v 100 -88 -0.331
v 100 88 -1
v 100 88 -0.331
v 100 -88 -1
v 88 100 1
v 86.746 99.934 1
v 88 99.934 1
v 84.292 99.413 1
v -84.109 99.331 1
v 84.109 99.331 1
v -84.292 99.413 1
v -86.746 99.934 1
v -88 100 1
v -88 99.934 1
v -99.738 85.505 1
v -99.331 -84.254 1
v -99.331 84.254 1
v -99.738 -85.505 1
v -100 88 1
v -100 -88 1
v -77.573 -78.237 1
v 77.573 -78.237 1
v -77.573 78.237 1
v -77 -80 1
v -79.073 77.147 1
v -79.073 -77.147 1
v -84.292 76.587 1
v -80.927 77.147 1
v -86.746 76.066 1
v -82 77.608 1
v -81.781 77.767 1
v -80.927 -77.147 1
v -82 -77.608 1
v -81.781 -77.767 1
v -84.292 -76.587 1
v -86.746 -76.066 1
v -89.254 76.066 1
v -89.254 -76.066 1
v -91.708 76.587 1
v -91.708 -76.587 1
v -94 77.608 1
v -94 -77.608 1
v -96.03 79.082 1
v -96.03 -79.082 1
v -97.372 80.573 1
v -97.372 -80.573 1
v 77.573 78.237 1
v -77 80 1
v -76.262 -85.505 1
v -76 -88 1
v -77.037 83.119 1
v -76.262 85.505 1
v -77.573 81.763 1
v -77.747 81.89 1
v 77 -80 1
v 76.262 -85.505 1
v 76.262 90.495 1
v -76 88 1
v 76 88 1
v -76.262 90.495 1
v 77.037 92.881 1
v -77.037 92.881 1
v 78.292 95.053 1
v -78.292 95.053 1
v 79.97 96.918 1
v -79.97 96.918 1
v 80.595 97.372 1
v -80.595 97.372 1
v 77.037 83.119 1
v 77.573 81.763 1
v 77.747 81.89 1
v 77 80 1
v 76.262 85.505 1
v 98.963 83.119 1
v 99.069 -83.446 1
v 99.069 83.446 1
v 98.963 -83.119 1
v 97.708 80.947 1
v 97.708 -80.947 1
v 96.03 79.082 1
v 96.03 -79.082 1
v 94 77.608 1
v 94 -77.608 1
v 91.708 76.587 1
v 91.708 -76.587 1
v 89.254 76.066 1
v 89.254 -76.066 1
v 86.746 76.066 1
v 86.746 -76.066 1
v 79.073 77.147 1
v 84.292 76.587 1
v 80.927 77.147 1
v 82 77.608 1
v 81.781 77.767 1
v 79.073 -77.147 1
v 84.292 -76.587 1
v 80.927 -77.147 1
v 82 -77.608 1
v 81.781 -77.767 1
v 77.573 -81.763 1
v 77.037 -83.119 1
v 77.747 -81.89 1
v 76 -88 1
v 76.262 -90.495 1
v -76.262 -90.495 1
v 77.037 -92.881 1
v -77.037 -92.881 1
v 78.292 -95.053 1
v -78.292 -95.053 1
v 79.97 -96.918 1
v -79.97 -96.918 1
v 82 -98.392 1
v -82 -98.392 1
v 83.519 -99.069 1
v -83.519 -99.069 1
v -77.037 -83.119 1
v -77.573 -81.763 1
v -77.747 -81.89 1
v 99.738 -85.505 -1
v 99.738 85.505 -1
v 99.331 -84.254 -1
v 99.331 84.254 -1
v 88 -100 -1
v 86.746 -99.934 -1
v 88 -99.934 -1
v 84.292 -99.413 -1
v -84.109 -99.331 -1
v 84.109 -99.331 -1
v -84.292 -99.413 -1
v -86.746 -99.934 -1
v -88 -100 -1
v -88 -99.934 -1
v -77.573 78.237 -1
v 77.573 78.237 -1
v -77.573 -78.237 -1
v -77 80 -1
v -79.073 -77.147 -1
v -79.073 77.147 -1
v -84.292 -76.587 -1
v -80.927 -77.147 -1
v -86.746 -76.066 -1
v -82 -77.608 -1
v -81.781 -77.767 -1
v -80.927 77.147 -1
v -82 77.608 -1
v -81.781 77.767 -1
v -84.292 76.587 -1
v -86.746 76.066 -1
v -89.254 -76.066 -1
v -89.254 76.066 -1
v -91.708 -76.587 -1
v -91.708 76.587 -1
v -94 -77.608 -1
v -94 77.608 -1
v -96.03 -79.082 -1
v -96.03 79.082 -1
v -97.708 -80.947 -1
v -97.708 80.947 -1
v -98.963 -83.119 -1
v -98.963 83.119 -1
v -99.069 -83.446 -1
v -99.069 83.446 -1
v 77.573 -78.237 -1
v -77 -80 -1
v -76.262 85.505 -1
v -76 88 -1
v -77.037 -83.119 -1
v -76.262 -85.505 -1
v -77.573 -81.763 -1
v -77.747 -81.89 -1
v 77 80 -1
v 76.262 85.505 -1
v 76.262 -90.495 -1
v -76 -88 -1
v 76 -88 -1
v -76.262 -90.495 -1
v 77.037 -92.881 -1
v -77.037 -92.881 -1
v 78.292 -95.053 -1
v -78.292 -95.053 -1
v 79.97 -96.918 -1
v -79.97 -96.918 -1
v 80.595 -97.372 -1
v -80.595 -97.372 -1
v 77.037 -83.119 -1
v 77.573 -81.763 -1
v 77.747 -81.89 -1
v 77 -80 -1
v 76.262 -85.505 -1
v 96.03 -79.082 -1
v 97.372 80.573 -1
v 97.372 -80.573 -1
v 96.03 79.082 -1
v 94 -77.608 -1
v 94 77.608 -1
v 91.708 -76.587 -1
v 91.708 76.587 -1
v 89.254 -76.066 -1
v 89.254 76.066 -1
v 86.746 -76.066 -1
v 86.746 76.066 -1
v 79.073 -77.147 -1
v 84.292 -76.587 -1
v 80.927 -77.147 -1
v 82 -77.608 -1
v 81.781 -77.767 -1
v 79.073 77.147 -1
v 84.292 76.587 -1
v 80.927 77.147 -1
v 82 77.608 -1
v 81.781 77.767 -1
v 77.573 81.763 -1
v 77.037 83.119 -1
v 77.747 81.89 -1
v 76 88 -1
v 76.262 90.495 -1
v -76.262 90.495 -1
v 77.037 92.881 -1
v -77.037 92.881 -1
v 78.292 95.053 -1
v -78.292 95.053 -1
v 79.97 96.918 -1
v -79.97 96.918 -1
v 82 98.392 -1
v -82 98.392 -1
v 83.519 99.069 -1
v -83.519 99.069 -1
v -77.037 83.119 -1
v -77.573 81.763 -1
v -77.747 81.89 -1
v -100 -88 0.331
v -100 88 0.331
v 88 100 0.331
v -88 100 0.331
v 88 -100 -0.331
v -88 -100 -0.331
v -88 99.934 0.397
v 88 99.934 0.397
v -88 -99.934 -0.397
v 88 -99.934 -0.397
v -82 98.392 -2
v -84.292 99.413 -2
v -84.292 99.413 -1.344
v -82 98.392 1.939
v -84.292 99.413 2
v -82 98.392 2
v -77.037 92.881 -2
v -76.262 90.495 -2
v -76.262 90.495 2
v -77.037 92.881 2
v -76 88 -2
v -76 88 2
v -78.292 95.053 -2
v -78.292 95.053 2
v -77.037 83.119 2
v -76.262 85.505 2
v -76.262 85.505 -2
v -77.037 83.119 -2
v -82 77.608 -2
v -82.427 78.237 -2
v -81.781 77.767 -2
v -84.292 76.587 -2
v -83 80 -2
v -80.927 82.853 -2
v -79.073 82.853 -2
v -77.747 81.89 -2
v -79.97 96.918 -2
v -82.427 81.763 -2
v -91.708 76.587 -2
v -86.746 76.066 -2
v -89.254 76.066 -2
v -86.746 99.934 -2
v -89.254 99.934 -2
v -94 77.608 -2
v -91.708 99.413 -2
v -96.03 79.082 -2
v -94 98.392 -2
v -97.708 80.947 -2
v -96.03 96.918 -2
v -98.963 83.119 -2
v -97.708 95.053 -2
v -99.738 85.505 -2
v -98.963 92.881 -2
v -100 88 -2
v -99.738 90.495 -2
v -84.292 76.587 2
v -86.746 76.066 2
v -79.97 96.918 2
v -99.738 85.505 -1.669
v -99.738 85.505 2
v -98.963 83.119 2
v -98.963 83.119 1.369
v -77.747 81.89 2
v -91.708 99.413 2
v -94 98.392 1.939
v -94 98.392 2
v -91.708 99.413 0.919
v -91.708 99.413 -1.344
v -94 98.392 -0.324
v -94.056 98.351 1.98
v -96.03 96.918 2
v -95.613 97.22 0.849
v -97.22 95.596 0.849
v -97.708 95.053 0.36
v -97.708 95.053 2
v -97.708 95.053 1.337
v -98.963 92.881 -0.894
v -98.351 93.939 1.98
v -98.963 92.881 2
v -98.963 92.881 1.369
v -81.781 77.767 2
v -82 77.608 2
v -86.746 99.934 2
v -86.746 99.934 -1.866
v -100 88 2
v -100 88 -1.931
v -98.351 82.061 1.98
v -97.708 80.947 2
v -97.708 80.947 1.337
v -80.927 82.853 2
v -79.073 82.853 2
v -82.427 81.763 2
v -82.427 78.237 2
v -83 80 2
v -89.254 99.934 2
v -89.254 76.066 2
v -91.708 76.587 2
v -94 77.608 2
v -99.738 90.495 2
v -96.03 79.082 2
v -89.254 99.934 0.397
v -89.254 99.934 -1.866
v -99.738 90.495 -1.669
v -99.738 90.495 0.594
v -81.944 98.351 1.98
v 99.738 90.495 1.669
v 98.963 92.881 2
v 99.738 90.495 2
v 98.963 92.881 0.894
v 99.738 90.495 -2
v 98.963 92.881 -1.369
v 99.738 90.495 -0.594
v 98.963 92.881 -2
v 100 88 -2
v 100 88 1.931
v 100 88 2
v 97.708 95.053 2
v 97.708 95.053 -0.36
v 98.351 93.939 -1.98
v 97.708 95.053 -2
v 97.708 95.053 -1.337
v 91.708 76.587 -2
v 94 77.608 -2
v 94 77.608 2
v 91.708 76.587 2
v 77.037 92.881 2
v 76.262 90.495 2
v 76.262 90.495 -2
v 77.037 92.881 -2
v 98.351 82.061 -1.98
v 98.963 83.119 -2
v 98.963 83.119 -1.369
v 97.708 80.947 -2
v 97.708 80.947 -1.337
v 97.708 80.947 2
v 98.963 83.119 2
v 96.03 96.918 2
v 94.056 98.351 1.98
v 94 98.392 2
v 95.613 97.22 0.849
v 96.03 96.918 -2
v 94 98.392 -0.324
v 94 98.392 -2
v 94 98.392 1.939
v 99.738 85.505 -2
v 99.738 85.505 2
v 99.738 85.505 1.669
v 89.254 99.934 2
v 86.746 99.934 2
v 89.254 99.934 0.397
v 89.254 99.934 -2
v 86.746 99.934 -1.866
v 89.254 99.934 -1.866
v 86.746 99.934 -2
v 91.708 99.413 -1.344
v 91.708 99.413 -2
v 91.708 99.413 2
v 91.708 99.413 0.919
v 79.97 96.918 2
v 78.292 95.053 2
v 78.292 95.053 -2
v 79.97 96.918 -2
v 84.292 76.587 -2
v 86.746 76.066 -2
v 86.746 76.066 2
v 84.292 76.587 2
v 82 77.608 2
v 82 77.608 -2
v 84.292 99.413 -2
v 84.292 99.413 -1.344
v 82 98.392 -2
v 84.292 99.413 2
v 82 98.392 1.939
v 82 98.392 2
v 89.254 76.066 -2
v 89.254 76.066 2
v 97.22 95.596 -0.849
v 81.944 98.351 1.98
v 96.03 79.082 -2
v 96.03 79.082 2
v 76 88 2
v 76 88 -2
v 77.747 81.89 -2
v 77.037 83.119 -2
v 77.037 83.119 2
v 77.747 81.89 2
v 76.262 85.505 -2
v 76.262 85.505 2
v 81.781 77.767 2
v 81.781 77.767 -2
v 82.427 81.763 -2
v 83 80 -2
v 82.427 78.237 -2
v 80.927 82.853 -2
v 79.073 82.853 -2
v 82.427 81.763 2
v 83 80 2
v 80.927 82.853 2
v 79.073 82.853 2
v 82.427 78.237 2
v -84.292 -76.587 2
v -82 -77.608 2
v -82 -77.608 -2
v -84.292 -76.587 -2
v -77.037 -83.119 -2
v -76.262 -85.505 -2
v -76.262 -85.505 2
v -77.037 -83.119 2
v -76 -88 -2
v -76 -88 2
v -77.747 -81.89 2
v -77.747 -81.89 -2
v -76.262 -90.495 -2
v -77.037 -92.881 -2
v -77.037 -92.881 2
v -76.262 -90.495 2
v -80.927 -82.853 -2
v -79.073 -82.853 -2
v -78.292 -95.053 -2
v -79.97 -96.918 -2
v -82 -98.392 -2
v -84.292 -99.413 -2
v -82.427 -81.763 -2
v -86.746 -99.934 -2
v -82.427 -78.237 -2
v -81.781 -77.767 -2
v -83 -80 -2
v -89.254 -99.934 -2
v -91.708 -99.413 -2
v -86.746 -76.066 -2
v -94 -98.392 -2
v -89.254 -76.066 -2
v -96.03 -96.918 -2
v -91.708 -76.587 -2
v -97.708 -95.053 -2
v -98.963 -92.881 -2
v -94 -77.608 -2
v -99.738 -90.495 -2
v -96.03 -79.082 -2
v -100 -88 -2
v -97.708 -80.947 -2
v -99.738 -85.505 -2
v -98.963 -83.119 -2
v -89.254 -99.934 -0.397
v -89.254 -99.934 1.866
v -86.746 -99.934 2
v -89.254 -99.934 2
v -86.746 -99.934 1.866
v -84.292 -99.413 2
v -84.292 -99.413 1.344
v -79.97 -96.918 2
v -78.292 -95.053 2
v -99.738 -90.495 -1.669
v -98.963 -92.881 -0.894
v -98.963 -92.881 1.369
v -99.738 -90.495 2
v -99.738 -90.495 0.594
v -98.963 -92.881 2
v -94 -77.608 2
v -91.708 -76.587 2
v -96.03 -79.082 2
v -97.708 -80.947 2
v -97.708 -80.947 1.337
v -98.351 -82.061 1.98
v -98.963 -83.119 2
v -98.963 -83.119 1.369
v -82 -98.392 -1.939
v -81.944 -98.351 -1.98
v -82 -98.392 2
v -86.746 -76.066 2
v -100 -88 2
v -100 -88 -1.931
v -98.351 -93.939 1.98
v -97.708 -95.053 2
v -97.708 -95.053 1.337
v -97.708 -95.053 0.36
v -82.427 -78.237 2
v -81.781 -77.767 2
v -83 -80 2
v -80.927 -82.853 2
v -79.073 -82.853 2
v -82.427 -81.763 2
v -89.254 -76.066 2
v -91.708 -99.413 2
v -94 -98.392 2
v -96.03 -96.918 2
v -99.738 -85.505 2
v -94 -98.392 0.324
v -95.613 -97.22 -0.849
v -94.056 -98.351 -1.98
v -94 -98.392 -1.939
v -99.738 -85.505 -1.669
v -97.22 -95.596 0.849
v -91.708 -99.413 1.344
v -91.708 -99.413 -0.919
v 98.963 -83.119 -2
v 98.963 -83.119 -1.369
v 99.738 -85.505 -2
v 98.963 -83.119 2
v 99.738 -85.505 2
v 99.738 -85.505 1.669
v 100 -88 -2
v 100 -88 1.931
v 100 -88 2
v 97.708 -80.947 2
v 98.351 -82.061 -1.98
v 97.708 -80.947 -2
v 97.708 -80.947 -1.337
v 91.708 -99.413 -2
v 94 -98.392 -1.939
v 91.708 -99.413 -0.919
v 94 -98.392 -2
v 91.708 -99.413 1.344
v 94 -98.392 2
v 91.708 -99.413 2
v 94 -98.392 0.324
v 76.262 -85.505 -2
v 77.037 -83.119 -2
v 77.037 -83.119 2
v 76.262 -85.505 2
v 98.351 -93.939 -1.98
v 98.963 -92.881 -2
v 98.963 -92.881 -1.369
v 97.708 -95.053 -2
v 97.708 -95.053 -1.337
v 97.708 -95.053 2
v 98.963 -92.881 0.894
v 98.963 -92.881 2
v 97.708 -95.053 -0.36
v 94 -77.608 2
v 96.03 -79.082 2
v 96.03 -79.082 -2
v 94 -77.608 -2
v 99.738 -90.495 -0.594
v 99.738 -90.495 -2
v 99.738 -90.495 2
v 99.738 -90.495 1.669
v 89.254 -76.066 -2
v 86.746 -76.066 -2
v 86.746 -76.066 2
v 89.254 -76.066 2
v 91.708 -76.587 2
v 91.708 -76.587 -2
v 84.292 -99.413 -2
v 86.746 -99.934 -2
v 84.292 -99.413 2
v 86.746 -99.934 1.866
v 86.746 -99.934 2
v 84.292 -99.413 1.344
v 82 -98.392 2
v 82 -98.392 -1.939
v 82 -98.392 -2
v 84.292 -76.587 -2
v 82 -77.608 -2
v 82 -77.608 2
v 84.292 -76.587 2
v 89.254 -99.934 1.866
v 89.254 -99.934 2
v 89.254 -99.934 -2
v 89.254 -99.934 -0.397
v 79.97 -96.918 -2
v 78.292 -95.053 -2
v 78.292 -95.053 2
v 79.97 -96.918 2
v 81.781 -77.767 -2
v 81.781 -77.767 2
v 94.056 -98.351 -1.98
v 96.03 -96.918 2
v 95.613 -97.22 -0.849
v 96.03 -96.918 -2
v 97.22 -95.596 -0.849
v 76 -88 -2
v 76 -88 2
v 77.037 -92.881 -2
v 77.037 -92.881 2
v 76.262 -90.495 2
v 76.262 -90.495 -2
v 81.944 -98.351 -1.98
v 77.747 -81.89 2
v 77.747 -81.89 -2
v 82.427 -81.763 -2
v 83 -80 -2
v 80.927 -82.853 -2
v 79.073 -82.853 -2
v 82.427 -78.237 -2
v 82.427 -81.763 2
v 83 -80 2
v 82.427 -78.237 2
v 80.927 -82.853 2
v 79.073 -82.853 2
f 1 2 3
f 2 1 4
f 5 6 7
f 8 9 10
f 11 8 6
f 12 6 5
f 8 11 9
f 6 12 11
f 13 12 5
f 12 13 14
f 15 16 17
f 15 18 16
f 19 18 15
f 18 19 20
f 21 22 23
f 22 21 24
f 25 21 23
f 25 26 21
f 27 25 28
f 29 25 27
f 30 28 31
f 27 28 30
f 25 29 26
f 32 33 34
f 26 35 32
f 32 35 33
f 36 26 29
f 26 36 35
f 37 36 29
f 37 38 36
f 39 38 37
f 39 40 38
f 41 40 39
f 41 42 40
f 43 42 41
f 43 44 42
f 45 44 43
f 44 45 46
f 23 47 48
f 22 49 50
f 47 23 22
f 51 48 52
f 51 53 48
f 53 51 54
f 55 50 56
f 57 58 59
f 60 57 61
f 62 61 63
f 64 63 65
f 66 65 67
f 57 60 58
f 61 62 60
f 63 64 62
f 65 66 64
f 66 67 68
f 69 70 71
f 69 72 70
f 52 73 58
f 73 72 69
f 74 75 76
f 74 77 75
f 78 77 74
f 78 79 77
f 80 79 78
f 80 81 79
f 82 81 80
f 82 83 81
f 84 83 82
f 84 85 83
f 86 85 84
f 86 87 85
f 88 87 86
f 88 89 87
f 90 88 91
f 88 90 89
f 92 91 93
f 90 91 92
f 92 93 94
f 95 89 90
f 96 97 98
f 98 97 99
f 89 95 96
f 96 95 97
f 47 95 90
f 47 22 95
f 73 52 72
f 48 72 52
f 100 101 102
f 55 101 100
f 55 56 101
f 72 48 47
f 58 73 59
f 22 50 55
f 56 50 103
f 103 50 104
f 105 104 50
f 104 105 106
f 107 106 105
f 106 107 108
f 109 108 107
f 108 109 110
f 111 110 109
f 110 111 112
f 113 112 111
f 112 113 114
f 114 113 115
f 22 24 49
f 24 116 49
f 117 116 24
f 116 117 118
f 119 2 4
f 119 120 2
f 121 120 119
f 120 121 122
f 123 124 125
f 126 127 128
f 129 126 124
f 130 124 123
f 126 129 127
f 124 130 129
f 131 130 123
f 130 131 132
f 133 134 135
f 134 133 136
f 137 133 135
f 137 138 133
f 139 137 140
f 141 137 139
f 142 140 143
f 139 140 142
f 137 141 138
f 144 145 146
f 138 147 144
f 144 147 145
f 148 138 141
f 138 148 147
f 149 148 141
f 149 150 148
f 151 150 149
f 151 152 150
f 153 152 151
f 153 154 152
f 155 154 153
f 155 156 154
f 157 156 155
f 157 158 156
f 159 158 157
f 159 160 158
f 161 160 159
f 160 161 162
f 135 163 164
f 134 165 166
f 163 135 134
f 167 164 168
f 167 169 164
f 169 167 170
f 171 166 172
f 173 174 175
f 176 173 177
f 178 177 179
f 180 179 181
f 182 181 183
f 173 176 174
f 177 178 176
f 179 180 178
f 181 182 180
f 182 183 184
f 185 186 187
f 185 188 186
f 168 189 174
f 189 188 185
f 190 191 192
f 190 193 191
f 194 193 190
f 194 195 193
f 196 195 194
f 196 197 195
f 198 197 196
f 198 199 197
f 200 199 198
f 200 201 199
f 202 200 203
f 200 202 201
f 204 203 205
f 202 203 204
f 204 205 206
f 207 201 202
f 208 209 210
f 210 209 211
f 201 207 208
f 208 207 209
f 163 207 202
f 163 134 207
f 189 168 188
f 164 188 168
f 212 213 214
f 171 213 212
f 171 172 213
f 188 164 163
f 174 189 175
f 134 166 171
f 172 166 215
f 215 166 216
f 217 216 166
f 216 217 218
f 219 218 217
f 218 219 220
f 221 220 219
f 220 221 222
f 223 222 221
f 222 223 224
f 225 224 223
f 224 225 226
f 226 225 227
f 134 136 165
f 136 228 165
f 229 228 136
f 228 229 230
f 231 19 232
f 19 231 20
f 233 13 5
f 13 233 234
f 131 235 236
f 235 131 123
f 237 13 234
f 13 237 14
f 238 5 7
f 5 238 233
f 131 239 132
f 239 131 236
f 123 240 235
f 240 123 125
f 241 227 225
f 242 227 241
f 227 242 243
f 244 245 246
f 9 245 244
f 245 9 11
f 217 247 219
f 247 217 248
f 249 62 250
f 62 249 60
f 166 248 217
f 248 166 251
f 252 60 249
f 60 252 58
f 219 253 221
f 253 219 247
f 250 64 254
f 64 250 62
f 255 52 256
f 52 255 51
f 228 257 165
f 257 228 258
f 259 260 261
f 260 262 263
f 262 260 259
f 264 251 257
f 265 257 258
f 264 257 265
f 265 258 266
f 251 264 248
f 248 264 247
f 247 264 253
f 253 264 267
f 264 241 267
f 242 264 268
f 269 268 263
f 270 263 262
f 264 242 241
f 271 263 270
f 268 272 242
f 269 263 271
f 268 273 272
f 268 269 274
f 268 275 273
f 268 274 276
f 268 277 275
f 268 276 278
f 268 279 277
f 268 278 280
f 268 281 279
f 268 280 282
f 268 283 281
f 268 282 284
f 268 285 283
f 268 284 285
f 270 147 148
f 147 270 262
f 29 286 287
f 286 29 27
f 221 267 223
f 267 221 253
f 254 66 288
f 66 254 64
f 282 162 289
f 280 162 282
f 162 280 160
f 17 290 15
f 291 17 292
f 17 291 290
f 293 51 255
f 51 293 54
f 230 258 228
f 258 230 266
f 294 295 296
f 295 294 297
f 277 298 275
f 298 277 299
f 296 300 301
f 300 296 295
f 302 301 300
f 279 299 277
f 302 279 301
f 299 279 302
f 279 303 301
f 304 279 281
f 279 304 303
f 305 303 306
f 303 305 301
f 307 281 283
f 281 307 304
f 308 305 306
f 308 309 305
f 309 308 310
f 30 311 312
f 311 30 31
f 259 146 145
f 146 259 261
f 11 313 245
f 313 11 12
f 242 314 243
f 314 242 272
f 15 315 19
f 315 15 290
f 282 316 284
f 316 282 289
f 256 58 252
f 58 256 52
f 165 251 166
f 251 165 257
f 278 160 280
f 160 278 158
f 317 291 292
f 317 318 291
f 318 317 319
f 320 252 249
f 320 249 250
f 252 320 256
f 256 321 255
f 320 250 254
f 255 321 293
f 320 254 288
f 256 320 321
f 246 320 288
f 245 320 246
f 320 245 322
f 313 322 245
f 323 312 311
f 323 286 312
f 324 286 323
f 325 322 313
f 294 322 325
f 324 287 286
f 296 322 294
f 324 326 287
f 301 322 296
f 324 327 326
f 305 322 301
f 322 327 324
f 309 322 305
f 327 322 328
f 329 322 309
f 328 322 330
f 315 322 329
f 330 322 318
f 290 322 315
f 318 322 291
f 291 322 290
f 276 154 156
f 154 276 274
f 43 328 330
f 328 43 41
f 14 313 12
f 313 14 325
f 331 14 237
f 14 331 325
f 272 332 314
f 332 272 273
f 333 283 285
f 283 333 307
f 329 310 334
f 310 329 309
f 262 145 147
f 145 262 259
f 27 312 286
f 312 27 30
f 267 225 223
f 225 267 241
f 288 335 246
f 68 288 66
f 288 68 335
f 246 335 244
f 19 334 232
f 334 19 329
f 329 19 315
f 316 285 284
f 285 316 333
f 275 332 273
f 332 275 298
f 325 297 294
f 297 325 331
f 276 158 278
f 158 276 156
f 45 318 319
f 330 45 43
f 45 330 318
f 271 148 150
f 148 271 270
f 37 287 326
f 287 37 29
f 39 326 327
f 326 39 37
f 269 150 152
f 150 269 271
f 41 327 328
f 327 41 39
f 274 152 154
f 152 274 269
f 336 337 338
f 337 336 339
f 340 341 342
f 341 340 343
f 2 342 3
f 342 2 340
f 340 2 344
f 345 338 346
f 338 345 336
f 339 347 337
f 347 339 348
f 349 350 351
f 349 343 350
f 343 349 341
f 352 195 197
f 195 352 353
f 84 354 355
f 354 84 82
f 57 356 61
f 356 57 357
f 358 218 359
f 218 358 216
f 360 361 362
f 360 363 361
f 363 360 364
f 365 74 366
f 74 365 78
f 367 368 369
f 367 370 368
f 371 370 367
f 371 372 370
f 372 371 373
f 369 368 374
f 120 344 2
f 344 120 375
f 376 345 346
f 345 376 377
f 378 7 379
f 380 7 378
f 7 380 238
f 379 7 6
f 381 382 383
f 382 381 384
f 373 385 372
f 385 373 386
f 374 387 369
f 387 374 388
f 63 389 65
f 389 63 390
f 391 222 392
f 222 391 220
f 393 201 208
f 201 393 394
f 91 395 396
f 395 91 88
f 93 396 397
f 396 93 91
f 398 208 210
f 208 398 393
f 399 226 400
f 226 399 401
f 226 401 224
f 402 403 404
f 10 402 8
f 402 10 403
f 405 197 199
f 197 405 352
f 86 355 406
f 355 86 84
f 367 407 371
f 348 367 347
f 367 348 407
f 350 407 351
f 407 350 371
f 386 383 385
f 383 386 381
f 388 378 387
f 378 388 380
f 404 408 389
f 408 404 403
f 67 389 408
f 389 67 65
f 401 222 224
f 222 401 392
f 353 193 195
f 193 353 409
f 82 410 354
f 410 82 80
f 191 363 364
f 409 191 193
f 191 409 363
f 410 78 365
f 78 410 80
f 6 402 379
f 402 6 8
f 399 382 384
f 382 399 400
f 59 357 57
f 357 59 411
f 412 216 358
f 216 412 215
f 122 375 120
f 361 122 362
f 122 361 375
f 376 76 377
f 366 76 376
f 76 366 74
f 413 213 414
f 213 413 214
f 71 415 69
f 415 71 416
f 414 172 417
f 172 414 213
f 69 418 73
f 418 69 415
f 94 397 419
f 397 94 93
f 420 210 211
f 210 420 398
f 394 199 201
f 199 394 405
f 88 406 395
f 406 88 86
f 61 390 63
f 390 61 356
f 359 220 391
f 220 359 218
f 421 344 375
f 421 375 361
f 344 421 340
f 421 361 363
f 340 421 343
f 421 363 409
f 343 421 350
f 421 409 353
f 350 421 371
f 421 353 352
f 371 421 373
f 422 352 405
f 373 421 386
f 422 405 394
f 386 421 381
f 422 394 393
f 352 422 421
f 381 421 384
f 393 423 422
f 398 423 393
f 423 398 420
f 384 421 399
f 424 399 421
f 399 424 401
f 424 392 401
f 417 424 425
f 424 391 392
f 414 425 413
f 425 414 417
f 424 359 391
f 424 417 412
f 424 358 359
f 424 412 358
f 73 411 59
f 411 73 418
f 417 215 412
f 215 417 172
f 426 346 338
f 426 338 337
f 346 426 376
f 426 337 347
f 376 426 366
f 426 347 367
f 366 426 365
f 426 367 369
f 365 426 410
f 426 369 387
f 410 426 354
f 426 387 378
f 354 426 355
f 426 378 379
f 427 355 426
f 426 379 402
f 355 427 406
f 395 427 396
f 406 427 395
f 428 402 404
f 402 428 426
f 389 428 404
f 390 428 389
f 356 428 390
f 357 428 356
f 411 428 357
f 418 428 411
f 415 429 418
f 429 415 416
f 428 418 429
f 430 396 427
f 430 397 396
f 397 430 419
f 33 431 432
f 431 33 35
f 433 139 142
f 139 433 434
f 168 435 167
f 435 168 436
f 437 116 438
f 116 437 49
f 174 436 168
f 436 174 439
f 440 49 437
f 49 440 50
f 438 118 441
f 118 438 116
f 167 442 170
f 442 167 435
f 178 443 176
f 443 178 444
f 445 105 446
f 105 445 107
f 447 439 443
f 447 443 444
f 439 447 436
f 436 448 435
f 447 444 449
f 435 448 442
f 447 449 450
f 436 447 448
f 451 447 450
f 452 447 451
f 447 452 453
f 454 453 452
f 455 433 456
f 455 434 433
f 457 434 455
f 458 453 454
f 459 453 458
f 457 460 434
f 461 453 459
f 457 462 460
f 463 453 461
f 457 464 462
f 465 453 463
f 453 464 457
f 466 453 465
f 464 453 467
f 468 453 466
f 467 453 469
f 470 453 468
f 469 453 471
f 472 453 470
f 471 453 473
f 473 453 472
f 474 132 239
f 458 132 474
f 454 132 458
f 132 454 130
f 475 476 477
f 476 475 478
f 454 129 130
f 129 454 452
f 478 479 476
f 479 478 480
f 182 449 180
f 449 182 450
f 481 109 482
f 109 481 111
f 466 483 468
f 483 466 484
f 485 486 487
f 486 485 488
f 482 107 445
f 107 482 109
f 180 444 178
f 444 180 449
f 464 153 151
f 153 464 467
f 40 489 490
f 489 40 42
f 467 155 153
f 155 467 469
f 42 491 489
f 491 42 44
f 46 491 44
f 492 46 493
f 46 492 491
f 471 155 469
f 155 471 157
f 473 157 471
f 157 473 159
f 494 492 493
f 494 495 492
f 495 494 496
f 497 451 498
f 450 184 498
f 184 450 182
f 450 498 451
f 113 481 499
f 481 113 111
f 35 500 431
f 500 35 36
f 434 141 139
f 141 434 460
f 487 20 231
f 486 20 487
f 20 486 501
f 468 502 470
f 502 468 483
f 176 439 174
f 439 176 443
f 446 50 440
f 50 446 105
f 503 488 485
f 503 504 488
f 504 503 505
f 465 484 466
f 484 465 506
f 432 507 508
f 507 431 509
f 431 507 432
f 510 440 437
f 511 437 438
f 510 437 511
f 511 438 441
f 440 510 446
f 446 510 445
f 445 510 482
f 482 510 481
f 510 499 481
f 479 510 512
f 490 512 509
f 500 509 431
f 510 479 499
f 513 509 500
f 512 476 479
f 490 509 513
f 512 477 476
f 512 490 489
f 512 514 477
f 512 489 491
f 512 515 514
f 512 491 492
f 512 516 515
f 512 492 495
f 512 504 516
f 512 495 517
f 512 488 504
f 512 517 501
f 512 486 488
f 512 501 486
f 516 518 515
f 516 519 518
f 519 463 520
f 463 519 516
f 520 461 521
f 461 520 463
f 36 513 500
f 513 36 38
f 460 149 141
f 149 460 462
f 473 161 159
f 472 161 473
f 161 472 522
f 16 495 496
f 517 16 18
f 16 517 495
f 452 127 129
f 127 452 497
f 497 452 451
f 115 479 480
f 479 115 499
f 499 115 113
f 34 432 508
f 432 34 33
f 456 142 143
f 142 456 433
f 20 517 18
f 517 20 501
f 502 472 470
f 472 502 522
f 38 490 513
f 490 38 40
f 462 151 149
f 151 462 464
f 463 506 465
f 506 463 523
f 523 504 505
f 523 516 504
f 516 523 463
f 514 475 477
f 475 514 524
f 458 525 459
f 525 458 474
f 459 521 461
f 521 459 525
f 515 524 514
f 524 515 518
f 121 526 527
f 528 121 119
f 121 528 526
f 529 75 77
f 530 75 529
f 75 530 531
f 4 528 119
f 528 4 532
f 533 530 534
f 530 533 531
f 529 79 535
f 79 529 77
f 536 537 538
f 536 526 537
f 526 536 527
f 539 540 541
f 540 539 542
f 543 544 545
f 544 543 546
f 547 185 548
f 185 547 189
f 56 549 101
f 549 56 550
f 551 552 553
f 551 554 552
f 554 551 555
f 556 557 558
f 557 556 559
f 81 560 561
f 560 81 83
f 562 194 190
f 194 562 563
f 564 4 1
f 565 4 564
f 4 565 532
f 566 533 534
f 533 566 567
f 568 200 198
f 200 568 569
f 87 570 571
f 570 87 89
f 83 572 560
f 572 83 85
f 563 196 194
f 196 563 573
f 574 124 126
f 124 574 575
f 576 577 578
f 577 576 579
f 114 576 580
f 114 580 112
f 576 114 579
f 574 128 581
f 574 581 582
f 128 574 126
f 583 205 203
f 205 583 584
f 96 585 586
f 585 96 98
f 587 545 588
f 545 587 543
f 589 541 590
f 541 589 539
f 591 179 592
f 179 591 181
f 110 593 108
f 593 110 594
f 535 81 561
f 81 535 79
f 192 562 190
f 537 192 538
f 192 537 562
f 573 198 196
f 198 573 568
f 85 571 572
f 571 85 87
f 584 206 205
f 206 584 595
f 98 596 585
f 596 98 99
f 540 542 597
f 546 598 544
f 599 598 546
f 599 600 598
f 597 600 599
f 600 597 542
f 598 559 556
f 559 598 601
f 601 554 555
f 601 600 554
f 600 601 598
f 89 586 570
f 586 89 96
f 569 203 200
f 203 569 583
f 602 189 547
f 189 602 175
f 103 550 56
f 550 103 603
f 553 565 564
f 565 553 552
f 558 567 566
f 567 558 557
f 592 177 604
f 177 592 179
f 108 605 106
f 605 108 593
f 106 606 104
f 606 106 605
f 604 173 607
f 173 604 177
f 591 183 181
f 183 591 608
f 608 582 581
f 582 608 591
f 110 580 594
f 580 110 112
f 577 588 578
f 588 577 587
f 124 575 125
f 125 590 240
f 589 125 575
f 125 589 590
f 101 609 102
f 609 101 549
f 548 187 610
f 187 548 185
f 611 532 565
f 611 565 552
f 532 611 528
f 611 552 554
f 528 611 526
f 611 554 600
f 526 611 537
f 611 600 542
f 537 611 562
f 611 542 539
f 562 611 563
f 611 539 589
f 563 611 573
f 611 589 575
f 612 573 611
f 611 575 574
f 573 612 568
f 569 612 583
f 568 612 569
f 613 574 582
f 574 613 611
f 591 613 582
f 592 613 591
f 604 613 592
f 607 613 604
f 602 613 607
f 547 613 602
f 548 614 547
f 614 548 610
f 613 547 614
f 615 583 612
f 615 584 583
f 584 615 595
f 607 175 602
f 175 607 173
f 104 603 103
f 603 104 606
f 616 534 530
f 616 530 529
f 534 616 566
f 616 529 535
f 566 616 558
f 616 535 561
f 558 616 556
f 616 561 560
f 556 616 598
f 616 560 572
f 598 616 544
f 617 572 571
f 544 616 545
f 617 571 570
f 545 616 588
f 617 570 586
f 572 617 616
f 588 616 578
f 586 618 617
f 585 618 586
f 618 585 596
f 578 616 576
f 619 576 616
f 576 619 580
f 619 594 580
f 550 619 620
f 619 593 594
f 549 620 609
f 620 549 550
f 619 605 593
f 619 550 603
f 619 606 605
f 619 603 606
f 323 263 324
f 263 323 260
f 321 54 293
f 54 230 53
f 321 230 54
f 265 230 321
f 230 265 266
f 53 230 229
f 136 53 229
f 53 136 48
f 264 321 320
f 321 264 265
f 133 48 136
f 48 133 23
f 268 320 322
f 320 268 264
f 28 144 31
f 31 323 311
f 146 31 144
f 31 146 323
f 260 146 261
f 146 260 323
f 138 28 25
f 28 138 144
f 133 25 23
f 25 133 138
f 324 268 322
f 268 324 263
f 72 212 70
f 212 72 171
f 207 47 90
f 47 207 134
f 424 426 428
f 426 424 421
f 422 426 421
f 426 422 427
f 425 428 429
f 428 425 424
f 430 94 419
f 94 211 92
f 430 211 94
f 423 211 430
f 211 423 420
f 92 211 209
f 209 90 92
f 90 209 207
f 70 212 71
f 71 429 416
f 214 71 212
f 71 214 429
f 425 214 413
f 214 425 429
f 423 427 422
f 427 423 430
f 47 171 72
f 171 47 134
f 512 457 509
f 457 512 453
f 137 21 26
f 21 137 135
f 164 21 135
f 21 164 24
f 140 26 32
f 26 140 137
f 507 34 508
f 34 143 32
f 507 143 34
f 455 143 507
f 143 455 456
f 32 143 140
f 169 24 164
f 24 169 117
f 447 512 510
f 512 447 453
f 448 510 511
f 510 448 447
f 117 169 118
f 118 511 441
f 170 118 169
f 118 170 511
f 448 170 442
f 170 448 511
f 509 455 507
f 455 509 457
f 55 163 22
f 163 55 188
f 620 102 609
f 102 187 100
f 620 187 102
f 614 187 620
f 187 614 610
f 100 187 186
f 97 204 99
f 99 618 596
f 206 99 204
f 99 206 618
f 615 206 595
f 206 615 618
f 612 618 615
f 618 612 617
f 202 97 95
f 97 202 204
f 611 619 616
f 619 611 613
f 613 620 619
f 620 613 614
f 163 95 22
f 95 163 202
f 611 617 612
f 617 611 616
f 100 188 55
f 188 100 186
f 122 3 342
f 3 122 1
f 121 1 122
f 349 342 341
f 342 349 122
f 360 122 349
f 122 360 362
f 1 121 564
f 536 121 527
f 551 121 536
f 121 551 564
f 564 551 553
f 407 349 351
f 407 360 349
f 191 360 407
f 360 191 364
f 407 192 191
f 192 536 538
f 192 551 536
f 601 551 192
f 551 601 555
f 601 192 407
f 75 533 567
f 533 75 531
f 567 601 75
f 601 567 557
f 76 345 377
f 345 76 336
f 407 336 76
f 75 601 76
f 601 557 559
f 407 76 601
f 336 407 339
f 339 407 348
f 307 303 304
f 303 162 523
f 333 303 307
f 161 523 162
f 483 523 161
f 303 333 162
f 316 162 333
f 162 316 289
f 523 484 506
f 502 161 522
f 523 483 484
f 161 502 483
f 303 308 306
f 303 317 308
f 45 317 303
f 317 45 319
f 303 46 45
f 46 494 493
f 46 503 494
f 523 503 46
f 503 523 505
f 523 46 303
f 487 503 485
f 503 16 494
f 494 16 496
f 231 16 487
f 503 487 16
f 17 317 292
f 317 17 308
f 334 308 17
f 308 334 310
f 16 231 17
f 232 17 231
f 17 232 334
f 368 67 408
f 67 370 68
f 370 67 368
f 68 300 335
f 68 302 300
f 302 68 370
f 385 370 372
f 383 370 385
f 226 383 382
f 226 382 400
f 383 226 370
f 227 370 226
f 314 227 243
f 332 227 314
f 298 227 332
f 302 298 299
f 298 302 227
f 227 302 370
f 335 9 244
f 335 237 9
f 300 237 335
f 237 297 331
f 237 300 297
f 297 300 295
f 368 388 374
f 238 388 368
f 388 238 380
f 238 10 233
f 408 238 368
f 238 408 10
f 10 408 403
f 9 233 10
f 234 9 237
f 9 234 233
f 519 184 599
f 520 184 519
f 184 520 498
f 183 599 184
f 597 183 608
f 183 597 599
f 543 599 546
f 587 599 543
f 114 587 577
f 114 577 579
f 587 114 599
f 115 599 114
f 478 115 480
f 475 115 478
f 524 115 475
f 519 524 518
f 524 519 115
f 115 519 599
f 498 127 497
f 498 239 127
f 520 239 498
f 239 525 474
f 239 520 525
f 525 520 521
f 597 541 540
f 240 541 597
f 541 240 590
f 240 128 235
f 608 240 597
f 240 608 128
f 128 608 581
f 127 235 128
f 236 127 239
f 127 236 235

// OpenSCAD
// Parameters
sheet_length = 200; //[100:400:1]
sheet_width = 200; //[100:400:1]
sheet_thickness = 2; //[1:6:0.5]
corner_radius = 12; //[6:24:1]
hole_diameter = 6; //[3:12:0.5]
hole_edge_margin = 20; //[10:40:1]
chamfer_size = 0.8; //[0.2:2:0.1]
overlap = 1; //[0.5:2:0.5]

// Main sheet body
module sheet_body() {
  color("Silver")
  cube([sheet_length, sheet_width, sheet_thickness], center=true);
}

// Corner cut cylinders
module corner_cut(radius, x, y) {
  translate([x, y, 0])
    cylinder(h=sheet_thickness + 2*overlap, r=radius, center=true);
}

// Corner square cuts
module corner_square(x, y) {
  translate([x, y, 0])
    cube([corner_radius, corner_radius, sheet_thickness + 2*overlap], center=true);
}

// Mounting holes
module hole(x, y) {
  translate([x, y, 0])
    cylinder(h=sheet_thickness + 2*overlap, r=hole_diameter/2, center=true);
}

// Chamfer cuts
module chamfer_cut_x(x) {
  translate([x, 0, 0])
    rotate([0, 45, 0])
      cube([chamfer_size*2, sheet_width + 2*overlap, sheet_thickness + 2*overlap], center=true);
}

module chamfer_cut_y(y) {
  translate([0, y, 0])
    rotate([45, 0, 0])
      cube([sheet_length + 2*overlap, chamfer_size*2, sheet_thickness + 2*overlap], center=true);
}

// Final geometry
difference() {
  union() {
    difference() {
      sheet_body();
      // Remove corner squares
      corner_square(-sheet_length/2 + corner_radius/2, sheet_width/2 - corner_radius/2);
      corner_square(sheet_length/2 - corner_radius/2, sheet_width/2 - corner_radius/2);
      corner_square(-sheet_length/2 + corner_radius/2, -sheet_width/2 + corner_radius/2);
      corner_square(sheet_length/2 - corner_radius/2, -sheet_width/2 + corner_radius/2);
    }
    // Add rounded corners
    corner_cut(corner_radius, -sheet_length/2 + corner_radius, sheet_width/2 - corner_radius);
    corner_cut(corner_radius, sheet_length/2 - corner_radius, sheet_width/2 - corner_radius);
    corner_cut(corner_radius, -sheet_length/2 + corner_radius, -sheet_width/2 + corner_radius);
    corner_cut(corner_radius, sheet_length/2 - corner_radius, -sheet_width/2 + corner_radius);
  }
  // Remove mounting holes
  hole(-sheet_length/2 + hole_edge_margin, sheet_width/2 - hole_edge_margin);
  hole(sheet_length/2 - hole_edge_margin, sheet_width/2 - hole_edge_margin);
  hole(-sheet_length/2 + hole_edge_margin, -sheet_width/2 + hole_edge_margin);
  hole(sheet_length/2 - hole_edge_margin, -sheet_width/2 + hole_edge_margin);
  // Apply chamfers
  chamfer_cut_x(sheet_length/2 - chamfer_size);
  chamfer_cut_x(-sheet_length/2 + chamfer_size);
  chamfer_cut_y(sheet_width/2 - chamfer_size);
  chamfer_cut_y(-sheet_width/2 + chamfer_size);
}
